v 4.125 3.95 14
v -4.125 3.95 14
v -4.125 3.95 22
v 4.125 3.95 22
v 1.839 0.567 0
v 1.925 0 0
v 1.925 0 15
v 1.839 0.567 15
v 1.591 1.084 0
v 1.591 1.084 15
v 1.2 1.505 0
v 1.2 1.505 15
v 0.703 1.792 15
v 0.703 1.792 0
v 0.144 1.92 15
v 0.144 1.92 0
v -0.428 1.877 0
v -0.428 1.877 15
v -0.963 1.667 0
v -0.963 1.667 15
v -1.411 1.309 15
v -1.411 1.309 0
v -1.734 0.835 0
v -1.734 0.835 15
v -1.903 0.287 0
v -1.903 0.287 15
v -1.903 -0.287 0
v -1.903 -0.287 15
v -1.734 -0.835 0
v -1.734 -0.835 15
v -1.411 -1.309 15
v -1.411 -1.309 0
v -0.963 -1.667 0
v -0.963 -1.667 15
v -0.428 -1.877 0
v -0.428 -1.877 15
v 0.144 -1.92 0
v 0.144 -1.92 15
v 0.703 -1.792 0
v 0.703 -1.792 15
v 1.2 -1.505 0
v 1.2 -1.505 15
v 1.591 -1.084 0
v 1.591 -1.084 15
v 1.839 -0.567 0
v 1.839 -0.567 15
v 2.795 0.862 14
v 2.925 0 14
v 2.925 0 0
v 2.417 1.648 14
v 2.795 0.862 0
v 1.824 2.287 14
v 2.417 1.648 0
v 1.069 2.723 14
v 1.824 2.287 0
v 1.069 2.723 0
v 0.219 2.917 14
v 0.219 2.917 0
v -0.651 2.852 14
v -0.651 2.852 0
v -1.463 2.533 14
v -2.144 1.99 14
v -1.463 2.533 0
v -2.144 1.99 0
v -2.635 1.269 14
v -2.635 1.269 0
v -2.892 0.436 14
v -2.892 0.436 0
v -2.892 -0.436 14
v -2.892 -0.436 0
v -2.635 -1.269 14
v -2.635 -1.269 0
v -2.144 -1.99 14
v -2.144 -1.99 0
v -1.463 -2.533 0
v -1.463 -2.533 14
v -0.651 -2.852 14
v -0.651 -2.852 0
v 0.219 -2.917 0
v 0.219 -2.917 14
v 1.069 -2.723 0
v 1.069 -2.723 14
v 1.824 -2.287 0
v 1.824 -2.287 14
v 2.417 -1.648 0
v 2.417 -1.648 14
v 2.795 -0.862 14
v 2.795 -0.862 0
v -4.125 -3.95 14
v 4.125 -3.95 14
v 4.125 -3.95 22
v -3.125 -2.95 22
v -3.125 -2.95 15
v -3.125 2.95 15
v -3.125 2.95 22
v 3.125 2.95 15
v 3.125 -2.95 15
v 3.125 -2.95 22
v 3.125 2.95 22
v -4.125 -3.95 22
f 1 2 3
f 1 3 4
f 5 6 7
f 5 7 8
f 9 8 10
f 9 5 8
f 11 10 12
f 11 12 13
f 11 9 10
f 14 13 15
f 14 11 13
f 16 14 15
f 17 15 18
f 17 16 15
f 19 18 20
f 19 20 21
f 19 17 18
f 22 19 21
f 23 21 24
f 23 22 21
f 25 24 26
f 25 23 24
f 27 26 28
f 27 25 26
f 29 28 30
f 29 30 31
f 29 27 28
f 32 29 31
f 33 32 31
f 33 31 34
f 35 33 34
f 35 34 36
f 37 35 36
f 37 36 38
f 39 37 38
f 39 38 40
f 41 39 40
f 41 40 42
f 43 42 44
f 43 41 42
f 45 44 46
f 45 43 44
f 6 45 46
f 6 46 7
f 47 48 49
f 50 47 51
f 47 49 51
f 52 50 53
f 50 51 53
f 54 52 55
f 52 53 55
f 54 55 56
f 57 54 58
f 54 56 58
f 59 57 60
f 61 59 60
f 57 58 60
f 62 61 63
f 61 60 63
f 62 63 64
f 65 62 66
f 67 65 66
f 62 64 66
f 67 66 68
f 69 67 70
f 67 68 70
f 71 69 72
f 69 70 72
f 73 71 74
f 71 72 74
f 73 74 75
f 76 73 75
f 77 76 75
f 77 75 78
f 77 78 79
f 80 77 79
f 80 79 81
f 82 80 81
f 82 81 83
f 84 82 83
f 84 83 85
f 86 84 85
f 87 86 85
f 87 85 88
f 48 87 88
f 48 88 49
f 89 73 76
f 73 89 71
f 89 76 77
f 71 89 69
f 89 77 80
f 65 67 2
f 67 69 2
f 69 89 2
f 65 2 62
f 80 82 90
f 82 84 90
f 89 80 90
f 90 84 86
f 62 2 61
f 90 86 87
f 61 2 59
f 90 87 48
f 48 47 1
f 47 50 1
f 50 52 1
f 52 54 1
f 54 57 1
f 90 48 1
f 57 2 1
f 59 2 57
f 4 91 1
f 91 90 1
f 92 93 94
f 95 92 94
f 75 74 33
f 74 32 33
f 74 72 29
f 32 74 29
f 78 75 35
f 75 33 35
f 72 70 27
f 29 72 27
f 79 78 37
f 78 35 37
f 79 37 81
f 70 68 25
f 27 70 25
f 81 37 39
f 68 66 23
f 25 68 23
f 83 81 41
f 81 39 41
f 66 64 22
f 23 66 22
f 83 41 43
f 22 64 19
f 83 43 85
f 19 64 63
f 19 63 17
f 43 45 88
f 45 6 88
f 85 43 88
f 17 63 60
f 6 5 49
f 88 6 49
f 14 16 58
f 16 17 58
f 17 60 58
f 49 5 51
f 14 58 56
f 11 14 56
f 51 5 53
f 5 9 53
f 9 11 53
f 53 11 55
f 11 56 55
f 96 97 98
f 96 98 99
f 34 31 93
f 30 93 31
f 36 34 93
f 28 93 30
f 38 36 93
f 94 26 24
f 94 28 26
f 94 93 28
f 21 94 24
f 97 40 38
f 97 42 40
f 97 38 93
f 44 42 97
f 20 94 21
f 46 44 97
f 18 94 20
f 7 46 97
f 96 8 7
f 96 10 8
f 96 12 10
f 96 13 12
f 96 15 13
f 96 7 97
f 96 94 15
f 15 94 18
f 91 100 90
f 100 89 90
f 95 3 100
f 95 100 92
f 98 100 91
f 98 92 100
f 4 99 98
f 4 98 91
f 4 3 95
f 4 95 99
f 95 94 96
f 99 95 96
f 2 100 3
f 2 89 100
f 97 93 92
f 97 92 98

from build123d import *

# Parameters (mm, degrees)
F0_R     = 2.925
F0_R_2   = 1.925
F1_DEPTH = 15
F3_W     = 8.25
F3_H     = 7.9
F3_W_2   = 6.25
F3_H_2   = 5.9
F3_R     = 2.925
F4_DEPTH = 1
F5_DEPTH = 7


with BuildPart() as f1:
    # F0 (on Top) → F1 (new body)
    with BuildSketch(Plane.XY):
        Circle(F0_R)
        Circle(F0_R_2, mode=Mode.SUBTRACT)
    extrude(amount=F1_DEPTH)

    # F3 (on face) → F4 (join)
    with BuildSketch(Plane.XY.offset(15)):
        Rectangle(F3_W, F3_H)
        Rectangle(F3_W_2, F3_H_2, mode=Mode.SUBTRACT)
        Rectangle(F3_W_2, F3_H_2)
        Circle(F3_R, mode=Mode.SUBTRACT)
    extrude(amount=-F4_DEPTH)

    # F3 (on face) → F5 (join)
    with BuildSketch(Plane.XY.offset(15)):
        Rectangle(F3_W, F3_H)
        Rectangle(F3_W_2, F3_H_2, mode=Mode.SUBTRACT)
    extrude(amount=F5_DEPTH)


solid = f1.part
